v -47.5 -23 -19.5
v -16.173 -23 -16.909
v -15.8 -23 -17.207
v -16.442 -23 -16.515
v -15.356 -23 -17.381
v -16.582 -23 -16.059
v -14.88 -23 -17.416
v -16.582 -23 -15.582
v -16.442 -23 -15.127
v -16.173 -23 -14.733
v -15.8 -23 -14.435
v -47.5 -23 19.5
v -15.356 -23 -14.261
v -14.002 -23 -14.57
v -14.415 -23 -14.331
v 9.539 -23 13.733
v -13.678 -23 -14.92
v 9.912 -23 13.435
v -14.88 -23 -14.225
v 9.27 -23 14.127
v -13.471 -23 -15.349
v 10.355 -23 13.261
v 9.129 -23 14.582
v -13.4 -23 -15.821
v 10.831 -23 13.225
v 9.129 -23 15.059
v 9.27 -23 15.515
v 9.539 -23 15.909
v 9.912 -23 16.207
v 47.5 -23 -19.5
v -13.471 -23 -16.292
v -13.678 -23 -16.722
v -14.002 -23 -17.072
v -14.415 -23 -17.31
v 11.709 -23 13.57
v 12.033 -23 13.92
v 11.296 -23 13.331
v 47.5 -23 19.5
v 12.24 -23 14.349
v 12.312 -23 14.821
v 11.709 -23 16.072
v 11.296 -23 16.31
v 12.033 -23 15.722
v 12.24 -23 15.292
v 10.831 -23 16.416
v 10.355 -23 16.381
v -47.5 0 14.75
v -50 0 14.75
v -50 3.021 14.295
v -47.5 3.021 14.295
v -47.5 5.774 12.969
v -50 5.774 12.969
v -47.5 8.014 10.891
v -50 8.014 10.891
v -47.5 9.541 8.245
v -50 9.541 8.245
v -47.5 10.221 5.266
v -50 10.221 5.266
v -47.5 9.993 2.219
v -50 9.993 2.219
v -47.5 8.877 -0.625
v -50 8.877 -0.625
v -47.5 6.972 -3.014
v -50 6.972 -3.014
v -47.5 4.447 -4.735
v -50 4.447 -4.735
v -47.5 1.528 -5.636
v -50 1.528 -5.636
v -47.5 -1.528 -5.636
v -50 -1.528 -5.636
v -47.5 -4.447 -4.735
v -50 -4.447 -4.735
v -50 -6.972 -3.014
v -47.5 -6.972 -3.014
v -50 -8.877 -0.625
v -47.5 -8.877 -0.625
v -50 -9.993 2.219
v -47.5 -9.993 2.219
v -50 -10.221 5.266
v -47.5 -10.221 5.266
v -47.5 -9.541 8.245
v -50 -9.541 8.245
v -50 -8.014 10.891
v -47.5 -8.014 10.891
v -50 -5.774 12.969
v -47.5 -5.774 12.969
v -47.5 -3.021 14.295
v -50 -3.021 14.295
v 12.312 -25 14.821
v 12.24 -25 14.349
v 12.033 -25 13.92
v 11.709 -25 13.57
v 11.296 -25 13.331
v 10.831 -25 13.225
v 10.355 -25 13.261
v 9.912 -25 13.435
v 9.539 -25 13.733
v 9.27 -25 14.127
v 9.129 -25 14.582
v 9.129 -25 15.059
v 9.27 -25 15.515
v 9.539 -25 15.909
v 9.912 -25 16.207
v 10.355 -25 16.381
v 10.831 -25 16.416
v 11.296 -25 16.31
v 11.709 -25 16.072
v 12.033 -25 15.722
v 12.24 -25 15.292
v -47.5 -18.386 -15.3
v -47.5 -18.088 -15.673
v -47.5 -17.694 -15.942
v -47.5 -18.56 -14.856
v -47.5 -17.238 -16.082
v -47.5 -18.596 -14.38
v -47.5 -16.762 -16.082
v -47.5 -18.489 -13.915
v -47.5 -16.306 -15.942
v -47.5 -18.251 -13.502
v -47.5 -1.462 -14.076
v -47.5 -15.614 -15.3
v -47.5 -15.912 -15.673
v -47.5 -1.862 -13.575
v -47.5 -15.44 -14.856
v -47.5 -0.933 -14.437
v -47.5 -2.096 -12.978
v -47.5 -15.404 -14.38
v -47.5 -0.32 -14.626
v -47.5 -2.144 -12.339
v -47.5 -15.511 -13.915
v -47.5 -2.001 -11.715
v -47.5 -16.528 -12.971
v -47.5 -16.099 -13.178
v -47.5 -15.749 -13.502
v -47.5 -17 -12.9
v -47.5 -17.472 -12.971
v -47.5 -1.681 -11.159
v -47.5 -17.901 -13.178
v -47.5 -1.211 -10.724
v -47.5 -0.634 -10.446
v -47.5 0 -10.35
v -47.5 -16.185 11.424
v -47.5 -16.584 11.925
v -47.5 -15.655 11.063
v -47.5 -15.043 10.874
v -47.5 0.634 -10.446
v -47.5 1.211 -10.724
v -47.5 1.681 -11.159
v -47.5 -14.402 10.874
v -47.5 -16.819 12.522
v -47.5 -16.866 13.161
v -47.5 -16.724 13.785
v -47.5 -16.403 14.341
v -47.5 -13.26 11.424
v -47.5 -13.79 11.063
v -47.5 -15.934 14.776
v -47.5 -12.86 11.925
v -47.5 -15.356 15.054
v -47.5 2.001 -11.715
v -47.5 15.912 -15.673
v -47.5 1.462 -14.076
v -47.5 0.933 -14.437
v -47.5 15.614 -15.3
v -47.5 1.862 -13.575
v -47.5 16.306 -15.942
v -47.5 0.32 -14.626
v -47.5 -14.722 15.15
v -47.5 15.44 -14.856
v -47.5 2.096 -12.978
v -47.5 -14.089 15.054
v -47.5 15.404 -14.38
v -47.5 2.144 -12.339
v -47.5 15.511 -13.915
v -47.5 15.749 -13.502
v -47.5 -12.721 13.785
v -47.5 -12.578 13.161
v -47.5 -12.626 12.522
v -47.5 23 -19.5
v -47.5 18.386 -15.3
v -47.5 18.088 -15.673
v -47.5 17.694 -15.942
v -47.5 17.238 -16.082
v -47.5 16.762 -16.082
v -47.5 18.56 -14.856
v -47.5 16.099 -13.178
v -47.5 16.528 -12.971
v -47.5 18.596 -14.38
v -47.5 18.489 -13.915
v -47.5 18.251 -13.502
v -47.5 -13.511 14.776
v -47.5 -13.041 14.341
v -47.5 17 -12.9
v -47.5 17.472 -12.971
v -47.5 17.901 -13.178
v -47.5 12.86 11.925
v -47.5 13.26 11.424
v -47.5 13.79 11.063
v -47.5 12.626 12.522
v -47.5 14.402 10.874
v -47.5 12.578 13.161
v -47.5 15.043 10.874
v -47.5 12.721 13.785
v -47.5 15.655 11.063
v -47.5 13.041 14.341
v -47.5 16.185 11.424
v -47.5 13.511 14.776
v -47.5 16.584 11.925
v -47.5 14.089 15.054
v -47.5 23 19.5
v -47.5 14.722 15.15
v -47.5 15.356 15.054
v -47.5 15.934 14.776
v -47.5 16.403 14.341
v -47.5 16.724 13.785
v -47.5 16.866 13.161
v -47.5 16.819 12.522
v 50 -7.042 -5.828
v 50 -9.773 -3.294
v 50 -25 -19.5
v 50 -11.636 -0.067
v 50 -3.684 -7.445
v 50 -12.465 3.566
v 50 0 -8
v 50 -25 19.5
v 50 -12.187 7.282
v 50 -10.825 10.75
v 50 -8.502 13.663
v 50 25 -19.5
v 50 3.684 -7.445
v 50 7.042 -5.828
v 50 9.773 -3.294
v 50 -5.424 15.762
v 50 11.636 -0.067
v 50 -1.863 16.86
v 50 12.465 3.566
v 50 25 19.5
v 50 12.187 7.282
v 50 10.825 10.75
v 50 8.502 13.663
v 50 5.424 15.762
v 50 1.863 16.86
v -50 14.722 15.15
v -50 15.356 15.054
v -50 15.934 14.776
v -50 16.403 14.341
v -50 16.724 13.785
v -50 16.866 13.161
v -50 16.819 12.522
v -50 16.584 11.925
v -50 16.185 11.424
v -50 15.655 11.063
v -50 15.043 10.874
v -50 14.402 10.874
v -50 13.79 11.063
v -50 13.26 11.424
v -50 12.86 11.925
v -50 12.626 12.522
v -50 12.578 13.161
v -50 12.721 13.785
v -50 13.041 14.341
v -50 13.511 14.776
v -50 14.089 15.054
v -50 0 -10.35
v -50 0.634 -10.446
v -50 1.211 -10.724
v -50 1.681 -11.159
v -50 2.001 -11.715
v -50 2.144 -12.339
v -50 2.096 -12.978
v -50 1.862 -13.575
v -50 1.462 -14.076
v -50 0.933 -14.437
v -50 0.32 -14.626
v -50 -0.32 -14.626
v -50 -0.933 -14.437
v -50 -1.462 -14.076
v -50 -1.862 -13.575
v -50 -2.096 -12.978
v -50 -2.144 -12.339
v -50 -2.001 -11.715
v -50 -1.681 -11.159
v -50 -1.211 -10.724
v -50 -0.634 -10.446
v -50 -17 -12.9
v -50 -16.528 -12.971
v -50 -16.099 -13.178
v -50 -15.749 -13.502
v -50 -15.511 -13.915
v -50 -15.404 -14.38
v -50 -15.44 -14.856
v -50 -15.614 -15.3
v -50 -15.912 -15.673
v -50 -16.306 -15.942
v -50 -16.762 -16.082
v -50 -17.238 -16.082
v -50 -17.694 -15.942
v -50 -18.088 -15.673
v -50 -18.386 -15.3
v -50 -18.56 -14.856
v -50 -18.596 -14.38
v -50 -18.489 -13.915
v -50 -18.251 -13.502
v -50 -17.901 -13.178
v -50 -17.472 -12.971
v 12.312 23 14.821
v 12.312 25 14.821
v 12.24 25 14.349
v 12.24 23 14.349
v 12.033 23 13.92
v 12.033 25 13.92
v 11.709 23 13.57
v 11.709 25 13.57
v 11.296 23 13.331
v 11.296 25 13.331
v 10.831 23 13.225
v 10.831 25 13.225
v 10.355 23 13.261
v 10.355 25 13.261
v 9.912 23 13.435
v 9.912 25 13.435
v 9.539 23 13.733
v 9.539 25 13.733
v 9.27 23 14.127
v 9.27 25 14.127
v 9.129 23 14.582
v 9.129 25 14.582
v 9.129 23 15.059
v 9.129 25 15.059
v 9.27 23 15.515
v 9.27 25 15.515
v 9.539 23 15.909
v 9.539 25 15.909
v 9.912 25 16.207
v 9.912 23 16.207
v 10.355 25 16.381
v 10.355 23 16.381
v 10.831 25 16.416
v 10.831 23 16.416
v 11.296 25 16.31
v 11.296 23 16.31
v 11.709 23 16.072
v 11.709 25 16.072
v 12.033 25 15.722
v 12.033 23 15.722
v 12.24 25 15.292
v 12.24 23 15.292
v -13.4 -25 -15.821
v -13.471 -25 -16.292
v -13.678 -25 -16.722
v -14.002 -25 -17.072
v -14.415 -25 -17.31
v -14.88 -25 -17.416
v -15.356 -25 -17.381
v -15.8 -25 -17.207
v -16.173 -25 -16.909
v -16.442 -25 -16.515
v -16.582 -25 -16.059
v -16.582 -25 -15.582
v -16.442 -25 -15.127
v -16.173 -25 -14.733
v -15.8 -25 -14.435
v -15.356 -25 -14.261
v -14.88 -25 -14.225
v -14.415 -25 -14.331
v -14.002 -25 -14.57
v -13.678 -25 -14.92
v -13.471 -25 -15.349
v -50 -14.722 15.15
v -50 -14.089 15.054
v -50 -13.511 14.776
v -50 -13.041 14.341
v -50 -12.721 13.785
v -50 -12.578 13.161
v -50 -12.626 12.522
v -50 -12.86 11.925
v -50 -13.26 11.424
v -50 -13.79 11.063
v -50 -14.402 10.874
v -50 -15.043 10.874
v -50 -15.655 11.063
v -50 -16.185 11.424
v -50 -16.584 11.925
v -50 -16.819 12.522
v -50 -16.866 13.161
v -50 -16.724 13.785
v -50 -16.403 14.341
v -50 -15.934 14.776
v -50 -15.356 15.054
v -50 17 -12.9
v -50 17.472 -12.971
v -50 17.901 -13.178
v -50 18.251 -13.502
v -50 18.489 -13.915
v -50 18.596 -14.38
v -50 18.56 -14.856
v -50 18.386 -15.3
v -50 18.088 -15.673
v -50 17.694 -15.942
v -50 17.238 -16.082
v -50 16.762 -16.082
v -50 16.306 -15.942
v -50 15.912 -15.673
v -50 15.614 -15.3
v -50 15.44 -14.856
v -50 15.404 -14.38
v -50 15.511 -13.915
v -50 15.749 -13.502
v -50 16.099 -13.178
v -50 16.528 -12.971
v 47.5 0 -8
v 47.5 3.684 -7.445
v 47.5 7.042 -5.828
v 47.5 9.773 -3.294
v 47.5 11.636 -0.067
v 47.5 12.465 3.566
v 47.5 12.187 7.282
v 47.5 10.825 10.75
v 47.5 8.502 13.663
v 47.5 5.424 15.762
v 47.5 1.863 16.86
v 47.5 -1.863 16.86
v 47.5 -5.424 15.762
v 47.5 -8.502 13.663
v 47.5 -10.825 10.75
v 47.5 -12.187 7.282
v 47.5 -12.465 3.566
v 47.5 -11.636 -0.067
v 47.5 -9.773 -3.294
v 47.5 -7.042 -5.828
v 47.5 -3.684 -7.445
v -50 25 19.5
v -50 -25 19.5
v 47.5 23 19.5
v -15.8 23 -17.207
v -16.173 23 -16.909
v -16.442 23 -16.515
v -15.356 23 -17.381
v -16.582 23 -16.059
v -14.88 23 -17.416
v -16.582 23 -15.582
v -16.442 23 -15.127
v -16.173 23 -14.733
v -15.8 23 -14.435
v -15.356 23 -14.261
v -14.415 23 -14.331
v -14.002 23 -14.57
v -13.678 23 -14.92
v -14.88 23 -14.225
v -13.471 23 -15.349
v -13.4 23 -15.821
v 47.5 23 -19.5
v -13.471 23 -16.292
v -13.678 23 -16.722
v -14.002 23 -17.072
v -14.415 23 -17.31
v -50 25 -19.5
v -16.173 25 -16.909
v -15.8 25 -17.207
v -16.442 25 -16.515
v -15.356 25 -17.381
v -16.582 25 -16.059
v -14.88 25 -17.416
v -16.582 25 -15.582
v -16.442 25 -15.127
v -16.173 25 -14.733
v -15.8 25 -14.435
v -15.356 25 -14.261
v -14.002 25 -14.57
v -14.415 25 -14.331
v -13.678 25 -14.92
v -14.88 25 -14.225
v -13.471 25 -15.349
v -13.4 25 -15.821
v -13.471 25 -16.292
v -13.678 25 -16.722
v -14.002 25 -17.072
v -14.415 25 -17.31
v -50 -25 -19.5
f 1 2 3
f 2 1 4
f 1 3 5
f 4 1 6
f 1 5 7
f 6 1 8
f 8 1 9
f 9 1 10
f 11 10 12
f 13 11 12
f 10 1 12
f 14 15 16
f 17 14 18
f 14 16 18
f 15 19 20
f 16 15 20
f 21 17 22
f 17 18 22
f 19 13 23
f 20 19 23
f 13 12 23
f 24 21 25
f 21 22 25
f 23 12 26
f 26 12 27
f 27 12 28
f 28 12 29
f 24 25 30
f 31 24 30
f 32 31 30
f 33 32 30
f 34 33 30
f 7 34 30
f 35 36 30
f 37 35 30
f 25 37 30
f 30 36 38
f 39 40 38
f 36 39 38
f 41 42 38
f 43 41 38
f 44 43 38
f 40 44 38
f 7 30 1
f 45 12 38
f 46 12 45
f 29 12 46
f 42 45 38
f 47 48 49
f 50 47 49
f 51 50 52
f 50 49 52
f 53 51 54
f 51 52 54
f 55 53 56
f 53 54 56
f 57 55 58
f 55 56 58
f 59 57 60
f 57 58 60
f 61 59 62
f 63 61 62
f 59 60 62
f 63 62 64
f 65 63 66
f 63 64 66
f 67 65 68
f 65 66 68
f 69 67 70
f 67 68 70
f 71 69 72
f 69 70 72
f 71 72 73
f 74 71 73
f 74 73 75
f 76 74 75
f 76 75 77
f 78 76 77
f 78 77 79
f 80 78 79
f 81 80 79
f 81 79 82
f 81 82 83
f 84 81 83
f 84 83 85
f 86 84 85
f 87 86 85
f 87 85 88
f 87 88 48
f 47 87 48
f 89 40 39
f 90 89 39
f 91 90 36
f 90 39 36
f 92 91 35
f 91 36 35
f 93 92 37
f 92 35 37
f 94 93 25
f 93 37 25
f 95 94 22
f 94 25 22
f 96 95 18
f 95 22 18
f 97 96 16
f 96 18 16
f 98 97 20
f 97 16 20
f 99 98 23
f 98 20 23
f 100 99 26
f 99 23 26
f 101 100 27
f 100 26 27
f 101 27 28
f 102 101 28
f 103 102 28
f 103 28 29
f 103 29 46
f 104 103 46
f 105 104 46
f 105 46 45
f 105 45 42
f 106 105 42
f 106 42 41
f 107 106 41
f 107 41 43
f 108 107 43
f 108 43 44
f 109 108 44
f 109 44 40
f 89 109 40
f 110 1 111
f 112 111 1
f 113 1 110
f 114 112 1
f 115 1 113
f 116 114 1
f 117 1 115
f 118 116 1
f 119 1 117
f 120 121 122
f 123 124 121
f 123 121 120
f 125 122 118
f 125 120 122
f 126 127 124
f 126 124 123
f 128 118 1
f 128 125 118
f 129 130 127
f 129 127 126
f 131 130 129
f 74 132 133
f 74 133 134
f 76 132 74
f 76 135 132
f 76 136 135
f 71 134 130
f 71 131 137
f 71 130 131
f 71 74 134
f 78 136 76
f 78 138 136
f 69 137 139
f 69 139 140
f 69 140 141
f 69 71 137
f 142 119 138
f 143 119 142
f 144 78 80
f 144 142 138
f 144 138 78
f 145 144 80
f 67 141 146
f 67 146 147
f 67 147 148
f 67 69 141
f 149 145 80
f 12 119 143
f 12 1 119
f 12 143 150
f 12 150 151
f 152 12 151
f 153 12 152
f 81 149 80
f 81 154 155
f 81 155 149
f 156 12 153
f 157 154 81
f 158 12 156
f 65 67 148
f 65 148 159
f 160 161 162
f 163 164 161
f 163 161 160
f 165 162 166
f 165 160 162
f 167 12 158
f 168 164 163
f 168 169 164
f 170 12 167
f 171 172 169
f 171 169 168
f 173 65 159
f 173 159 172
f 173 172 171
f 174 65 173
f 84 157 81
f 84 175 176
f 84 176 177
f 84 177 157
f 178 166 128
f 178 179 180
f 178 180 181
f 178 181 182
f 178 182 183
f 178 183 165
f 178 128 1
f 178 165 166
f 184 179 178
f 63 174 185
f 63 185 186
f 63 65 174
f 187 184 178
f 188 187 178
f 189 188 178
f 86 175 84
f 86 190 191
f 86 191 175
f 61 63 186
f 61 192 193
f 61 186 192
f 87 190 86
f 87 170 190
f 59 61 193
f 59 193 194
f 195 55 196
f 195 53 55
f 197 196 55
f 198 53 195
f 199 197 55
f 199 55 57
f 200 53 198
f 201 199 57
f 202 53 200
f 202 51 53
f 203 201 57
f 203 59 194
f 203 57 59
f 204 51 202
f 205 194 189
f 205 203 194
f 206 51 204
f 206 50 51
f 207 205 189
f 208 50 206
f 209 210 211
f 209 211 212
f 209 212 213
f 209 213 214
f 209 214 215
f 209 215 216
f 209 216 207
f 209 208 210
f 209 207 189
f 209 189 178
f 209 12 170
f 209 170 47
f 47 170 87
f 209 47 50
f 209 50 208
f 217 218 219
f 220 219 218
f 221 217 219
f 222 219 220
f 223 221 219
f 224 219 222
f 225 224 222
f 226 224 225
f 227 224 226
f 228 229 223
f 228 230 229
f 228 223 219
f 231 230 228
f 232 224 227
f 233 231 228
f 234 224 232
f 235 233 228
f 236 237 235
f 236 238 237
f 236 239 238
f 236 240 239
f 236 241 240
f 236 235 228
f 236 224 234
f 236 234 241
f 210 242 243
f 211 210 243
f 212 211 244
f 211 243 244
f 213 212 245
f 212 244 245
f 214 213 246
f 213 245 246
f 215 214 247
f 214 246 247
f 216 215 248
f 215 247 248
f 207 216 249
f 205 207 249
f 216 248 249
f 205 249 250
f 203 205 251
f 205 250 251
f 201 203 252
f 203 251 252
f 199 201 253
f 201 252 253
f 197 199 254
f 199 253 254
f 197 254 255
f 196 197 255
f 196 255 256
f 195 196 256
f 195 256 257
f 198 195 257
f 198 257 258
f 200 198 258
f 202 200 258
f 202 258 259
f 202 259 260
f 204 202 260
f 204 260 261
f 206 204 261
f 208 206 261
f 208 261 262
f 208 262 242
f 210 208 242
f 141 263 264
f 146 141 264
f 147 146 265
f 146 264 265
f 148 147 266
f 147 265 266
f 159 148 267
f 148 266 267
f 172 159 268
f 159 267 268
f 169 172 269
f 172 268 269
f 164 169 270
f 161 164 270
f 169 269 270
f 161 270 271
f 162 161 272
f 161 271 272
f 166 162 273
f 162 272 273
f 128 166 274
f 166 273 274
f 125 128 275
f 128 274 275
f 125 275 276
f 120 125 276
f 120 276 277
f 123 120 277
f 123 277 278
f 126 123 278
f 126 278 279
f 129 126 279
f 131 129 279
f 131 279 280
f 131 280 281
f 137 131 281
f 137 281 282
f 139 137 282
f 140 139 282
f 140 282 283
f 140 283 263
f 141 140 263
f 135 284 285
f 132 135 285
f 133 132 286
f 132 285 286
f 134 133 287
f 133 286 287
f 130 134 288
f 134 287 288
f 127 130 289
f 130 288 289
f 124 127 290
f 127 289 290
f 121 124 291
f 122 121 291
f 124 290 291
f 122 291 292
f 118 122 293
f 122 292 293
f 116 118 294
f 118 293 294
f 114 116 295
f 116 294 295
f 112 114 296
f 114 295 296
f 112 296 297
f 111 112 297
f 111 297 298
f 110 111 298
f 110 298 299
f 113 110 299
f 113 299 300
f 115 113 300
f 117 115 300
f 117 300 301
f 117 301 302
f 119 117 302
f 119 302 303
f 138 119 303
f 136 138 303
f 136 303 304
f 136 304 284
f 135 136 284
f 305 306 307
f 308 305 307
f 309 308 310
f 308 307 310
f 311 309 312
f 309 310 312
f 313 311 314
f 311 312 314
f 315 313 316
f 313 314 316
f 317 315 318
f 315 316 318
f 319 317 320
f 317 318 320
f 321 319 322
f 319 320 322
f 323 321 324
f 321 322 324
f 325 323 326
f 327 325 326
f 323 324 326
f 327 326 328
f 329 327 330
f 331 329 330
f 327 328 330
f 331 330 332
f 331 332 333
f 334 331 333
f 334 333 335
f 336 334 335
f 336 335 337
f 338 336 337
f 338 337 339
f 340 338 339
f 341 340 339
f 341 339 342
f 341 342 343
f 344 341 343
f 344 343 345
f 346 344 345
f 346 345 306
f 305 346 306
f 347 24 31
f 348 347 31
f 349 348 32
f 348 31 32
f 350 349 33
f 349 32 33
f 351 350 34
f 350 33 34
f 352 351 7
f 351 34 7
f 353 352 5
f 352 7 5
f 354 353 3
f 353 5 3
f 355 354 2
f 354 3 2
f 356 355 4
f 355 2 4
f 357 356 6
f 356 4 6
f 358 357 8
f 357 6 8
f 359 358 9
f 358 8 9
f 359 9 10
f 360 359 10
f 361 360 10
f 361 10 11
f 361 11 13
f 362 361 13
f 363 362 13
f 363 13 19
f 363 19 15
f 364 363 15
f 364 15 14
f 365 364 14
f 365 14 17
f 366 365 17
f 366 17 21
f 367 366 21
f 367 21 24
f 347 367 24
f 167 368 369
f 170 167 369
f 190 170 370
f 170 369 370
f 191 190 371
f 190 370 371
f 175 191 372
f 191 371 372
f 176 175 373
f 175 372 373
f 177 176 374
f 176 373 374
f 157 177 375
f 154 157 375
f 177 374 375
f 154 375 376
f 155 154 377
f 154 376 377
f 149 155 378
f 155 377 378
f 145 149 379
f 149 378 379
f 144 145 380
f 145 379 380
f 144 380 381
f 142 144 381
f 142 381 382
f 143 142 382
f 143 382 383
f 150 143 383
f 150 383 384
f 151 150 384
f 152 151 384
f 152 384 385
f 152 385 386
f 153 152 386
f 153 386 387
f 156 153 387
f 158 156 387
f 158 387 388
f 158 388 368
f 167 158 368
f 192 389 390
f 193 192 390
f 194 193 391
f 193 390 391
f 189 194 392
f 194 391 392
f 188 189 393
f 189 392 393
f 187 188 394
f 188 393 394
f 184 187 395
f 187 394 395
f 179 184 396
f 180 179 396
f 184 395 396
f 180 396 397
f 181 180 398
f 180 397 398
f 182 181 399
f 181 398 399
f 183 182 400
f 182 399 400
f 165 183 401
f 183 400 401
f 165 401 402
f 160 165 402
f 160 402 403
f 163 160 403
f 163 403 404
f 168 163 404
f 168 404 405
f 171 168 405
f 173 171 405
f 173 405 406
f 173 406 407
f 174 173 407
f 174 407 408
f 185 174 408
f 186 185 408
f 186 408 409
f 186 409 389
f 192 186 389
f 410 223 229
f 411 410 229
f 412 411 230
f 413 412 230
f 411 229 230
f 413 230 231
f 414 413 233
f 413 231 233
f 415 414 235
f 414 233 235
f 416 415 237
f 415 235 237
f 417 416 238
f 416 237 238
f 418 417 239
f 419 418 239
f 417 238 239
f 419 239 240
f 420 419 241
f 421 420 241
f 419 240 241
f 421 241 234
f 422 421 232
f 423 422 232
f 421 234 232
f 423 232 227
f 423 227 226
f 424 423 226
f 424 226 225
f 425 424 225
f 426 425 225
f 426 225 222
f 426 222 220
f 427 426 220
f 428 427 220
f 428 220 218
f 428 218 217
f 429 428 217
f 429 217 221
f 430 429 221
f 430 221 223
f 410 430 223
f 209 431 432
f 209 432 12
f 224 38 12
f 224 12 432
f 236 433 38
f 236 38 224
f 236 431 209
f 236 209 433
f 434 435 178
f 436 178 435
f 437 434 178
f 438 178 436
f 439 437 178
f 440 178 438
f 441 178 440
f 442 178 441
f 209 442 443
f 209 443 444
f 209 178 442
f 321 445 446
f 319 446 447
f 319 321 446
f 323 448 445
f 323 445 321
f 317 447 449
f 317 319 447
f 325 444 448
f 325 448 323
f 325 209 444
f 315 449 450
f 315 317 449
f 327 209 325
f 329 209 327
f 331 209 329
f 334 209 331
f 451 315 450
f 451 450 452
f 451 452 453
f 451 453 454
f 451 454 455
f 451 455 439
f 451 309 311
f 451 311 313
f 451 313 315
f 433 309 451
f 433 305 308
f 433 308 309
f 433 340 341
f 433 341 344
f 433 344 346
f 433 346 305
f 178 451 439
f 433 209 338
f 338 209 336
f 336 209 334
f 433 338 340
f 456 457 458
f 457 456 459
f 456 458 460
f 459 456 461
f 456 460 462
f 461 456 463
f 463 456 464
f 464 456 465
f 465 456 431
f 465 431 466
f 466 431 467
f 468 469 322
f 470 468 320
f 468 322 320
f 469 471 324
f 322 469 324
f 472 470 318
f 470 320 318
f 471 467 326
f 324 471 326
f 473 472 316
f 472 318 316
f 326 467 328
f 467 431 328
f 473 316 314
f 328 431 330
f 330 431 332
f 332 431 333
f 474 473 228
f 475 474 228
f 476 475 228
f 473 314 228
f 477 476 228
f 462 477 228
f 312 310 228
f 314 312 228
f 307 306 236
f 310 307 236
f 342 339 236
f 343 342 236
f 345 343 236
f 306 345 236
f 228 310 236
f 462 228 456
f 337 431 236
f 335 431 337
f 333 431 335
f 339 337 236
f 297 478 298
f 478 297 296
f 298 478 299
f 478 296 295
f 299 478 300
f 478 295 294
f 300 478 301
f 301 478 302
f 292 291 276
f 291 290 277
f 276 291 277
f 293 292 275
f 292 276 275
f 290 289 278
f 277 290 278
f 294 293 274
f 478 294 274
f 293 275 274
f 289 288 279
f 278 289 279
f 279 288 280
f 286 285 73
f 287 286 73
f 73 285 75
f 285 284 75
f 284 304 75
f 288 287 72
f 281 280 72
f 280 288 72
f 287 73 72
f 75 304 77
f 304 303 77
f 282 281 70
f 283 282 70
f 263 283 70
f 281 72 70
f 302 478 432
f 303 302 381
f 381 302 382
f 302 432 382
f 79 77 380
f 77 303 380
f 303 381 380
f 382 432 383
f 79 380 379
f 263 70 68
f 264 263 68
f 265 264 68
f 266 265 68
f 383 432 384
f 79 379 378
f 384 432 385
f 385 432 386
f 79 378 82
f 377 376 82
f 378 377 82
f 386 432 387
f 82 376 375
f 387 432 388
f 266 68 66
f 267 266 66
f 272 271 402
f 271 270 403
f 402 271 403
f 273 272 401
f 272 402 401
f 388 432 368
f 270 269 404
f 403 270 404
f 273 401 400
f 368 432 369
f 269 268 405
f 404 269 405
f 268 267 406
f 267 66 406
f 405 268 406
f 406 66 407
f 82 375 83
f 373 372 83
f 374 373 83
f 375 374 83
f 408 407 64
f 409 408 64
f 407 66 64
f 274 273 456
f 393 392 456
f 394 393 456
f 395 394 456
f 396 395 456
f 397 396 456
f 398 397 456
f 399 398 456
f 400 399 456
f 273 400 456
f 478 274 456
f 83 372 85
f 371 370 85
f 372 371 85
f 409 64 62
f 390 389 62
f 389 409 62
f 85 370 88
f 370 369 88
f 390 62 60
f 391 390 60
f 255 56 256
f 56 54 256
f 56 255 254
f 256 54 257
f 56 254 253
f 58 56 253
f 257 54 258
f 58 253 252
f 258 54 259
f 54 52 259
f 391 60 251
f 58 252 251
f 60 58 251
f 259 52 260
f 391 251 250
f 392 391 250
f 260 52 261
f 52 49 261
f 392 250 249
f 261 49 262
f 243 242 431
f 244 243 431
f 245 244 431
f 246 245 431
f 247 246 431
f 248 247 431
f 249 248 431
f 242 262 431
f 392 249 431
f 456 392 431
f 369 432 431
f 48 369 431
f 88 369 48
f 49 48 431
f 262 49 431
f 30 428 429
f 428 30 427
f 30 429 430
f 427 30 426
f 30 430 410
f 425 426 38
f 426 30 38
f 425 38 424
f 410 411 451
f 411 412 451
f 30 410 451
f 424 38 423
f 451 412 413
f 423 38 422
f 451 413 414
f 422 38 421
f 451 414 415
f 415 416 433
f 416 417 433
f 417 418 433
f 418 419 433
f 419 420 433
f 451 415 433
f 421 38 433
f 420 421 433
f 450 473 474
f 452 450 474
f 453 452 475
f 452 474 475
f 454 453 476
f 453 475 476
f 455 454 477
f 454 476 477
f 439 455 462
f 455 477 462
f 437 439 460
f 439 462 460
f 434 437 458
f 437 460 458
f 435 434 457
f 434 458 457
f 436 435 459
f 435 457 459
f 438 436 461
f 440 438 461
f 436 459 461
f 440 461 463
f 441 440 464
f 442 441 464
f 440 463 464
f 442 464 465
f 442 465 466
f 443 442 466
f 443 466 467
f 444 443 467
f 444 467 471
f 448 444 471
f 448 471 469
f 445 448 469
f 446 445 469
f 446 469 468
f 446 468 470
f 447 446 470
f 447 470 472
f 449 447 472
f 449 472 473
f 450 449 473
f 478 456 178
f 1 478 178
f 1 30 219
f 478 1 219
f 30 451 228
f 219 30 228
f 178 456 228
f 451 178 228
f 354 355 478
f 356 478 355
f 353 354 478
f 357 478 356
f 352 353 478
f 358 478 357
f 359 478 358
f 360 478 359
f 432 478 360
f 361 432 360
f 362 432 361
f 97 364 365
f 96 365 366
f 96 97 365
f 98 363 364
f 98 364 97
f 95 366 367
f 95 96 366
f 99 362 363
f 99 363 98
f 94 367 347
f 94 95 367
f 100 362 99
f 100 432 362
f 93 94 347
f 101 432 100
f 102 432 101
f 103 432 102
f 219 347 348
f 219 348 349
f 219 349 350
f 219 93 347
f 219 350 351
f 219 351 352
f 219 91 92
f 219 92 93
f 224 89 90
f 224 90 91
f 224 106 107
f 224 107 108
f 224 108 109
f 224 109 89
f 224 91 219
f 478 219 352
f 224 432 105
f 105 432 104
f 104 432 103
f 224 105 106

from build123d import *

# Parameters (mm, degrees)
SKETCH_1_W          = 100
SKETCH_1_H          = 50
SKETCH_1_W_2        = 95
SKETCH_1_H_2        = 46
EXTRUDE_1_DEPTH     = 19.5
SKETCH_2_R          = 1.6
CUT_EXTRUDE_1_DEPTH = 51
CUT_EXTRUDE_2_REACH = 102
SKETCH_3_R          = 10.25
SKETCH_3_R_2        = 2.15
SKETCH_3_R_3        = 1.6
CUT_EXTRUDE_3_REACH = 102
SKETCH_4_R          = 12.5


with BuildPart() as part:
    # ｽｹｯﾁ1 → ﾎﾞｽ - 押し出し1 (new body, symmetric)
    with BuildSketch(Plane.XY):
        Rectangle(SKETCH_1_W, SKETCH_1_H)
        Rectangle(SKETCH_1_W_2, SKETCH_1_H_2, mode=Mode.SUBTRACT)
    extrude(amount=EXTRUDE_1_DEPTH, both=True)

    # ｽｹｯﾁ2 → ｶｯﾄ - 押し出し1 (cut, through all)
    with BuildSketch(Plane(origin=(0, 25, 0), x_dir=(1, 0, 0), z_dir=(0, 1, 0))):
        with Locations((-15, 15.820888862)):
            Circle(SKETCH_2_R)
        with Locations((10.711504387, -14.820888862)):
            Circle(SKETCH_2_R)
    extrude(amount=-CUT_EXTRUDE_1_DEPTH, mode=Mode.SUBTRACT)

    # ｽｹｯﾁ3 → ｶｯﾄ - 押し出し2 (cut, up to next)
    with BuildSketch(Plane.ZY.offset(50), mode=Mode.PRIVATE) as cut_extrude_2_sk1:
        with Locations((4.5, 0)):
            Circle(SKETCH_3_R)
    cut_extrude_2_tool1 = extrude(cut_extrude_2_sk1.sketch, amount=-CUT_EXTRUDE_2_REACH, mode=Mode.PRIVATE) & part.part
    add(cut_extrude_2_tool1.solids().sort_by_distance((-50, 0, 4.5))[0], mode=Mode.SUBTRACT)
    # ｽｹｯﾁ3 → ｶｯﾄ - 押し出し2 (cut, up to next)
    with BuildSketch(Plane.ZY.offset(50), mode=Mode.PRIVATE) as cut_extrude_2_sk2:
        with Locations((-12.5, 0)):
            Circle(SKETCH_3_R_2)
    cut_extrude_2_tool2 = extrude(cut_extrude_2_sk2.sketch, amount=-CUT_EXTRUDE_2_REACH, mode=Mode.PRIVATE) & part.part
    add(cut_extrude_2_tool2.solids().sort_by_distance((-50, 0, -12.5))[0], mode=Mode.SUBTRACT)
    # ｽｹｯﾁ3 → ｶｯﾄ - 押し出し2 (cut, up to next)
    with BuildSketch(Plane.ZY.offset(50), mode=Mode.PRIVATE) as cut_extrude_2_sk3:
        with Locations((13, 14.722431864)):
            Circle(SKETCH_3_R_2)
    cut_extrude_2_tool3 = extrude(cut_extrude_2_sk3.sketch, amount=-CUT_EXTRUDE_2_REACH, mode=Mode.PRIVATE) & part.part
    add(cut_extrude_2_tool3.solids().sort_by_distance((-50, 14.722432, 13))[0], mode=Mode.SUBTRACT)
    # ｽｹｯﾁ3 → ｶｯﾄ - 押し出し2 (cut, up to next)
    with BuildSketch(Plane.ZY.offset(50), mode=Mode.PRIVATE) as cut_extrude_2_sk4:
        with Locations((13, -14.722431864)):
            Circle(SKETCH_3_R_2)
    cut_extrude_2_tool4 = extrude(cut_extrude_2_sk4.sketch, amount=-CUT_EXTRUDE_2_REACH, mode=Mode.PRIVATE) & part.part
    add(cut_extrude_2_tool4.solids().sort_by_distance((-50, -14.722432, 13))[0], mode=Mode.SUBTRACT)
    # ｽｹｯﾁ3 → ｶｯﾄ - 押し出し2 (cut, up to next)
    with BuildSketch(Plane.ZY.offset(50), mode=Mode.PRIVATE) as cut_extrude_2_sk5:
        with Locations((-14.5, -17)):
            Circle(SKETCH_3_R_3)
    cut_extrude_2_tool5 = extrude(cut_extrude_2_sk5.sketch, amount=-CUT_EXTRUDE_2_REACH, mode=Mode.PRIVATE) & part.part
    add(cut_extrude_2_tool5.solids().sort_by_distance((-50, -17, -14.5))[0], mode=Mode.SUBTRACT)
    # ｽｹｯﾁ3 → ｶｯﾄ - 押し出し2 (cut, up to next)
    with BuildSketch(Plane.ZY.offset(50), mode=Mode.PRIVATE) as cut_extrude_2_sk6:
        with Locations((-14.5, 17)):
            Circle(SKETCH_3_R_3)
    cut_extrude_2_tool6 = extrude(cut_extrude_2_sk6.sketch, amount=-CUT_EXTRUDE_2_REACH, mode=Mode.PRIVATE) & part.part
    add(cut_extrude_2_tool6.solids().sort_by_distance((-50, 17, -14.5))[0], mode=Mode.SUBTRACT)

    # ｽｹｯﾁ4 → ｶｯﾄ - 押し出し3 (cut, up to next)
    with BuildSketch(Plane(origin=(50, 0, 0), x_dir=(0, 0, -1), z_dir=(1, 0, 0)), mode=Mode.PRIVATE) as cut_extrude_3_sk1:
        with Locations((-4.5, 0)):
            Circle(SKETCH_4_R)
    cut_extrude_3_tool1 = extrude(cut_extrude_3_sk1.sketch, amount=-CUT_EXTRUDE_3_REACH, mode=Mode.PRIVATE) & part.part
    add(cut_extrude_3_tool1.solids().sort_by_distance((50, 0, 4.5))[0], mode=Mode.SUBTRACT)


solid = part.part
